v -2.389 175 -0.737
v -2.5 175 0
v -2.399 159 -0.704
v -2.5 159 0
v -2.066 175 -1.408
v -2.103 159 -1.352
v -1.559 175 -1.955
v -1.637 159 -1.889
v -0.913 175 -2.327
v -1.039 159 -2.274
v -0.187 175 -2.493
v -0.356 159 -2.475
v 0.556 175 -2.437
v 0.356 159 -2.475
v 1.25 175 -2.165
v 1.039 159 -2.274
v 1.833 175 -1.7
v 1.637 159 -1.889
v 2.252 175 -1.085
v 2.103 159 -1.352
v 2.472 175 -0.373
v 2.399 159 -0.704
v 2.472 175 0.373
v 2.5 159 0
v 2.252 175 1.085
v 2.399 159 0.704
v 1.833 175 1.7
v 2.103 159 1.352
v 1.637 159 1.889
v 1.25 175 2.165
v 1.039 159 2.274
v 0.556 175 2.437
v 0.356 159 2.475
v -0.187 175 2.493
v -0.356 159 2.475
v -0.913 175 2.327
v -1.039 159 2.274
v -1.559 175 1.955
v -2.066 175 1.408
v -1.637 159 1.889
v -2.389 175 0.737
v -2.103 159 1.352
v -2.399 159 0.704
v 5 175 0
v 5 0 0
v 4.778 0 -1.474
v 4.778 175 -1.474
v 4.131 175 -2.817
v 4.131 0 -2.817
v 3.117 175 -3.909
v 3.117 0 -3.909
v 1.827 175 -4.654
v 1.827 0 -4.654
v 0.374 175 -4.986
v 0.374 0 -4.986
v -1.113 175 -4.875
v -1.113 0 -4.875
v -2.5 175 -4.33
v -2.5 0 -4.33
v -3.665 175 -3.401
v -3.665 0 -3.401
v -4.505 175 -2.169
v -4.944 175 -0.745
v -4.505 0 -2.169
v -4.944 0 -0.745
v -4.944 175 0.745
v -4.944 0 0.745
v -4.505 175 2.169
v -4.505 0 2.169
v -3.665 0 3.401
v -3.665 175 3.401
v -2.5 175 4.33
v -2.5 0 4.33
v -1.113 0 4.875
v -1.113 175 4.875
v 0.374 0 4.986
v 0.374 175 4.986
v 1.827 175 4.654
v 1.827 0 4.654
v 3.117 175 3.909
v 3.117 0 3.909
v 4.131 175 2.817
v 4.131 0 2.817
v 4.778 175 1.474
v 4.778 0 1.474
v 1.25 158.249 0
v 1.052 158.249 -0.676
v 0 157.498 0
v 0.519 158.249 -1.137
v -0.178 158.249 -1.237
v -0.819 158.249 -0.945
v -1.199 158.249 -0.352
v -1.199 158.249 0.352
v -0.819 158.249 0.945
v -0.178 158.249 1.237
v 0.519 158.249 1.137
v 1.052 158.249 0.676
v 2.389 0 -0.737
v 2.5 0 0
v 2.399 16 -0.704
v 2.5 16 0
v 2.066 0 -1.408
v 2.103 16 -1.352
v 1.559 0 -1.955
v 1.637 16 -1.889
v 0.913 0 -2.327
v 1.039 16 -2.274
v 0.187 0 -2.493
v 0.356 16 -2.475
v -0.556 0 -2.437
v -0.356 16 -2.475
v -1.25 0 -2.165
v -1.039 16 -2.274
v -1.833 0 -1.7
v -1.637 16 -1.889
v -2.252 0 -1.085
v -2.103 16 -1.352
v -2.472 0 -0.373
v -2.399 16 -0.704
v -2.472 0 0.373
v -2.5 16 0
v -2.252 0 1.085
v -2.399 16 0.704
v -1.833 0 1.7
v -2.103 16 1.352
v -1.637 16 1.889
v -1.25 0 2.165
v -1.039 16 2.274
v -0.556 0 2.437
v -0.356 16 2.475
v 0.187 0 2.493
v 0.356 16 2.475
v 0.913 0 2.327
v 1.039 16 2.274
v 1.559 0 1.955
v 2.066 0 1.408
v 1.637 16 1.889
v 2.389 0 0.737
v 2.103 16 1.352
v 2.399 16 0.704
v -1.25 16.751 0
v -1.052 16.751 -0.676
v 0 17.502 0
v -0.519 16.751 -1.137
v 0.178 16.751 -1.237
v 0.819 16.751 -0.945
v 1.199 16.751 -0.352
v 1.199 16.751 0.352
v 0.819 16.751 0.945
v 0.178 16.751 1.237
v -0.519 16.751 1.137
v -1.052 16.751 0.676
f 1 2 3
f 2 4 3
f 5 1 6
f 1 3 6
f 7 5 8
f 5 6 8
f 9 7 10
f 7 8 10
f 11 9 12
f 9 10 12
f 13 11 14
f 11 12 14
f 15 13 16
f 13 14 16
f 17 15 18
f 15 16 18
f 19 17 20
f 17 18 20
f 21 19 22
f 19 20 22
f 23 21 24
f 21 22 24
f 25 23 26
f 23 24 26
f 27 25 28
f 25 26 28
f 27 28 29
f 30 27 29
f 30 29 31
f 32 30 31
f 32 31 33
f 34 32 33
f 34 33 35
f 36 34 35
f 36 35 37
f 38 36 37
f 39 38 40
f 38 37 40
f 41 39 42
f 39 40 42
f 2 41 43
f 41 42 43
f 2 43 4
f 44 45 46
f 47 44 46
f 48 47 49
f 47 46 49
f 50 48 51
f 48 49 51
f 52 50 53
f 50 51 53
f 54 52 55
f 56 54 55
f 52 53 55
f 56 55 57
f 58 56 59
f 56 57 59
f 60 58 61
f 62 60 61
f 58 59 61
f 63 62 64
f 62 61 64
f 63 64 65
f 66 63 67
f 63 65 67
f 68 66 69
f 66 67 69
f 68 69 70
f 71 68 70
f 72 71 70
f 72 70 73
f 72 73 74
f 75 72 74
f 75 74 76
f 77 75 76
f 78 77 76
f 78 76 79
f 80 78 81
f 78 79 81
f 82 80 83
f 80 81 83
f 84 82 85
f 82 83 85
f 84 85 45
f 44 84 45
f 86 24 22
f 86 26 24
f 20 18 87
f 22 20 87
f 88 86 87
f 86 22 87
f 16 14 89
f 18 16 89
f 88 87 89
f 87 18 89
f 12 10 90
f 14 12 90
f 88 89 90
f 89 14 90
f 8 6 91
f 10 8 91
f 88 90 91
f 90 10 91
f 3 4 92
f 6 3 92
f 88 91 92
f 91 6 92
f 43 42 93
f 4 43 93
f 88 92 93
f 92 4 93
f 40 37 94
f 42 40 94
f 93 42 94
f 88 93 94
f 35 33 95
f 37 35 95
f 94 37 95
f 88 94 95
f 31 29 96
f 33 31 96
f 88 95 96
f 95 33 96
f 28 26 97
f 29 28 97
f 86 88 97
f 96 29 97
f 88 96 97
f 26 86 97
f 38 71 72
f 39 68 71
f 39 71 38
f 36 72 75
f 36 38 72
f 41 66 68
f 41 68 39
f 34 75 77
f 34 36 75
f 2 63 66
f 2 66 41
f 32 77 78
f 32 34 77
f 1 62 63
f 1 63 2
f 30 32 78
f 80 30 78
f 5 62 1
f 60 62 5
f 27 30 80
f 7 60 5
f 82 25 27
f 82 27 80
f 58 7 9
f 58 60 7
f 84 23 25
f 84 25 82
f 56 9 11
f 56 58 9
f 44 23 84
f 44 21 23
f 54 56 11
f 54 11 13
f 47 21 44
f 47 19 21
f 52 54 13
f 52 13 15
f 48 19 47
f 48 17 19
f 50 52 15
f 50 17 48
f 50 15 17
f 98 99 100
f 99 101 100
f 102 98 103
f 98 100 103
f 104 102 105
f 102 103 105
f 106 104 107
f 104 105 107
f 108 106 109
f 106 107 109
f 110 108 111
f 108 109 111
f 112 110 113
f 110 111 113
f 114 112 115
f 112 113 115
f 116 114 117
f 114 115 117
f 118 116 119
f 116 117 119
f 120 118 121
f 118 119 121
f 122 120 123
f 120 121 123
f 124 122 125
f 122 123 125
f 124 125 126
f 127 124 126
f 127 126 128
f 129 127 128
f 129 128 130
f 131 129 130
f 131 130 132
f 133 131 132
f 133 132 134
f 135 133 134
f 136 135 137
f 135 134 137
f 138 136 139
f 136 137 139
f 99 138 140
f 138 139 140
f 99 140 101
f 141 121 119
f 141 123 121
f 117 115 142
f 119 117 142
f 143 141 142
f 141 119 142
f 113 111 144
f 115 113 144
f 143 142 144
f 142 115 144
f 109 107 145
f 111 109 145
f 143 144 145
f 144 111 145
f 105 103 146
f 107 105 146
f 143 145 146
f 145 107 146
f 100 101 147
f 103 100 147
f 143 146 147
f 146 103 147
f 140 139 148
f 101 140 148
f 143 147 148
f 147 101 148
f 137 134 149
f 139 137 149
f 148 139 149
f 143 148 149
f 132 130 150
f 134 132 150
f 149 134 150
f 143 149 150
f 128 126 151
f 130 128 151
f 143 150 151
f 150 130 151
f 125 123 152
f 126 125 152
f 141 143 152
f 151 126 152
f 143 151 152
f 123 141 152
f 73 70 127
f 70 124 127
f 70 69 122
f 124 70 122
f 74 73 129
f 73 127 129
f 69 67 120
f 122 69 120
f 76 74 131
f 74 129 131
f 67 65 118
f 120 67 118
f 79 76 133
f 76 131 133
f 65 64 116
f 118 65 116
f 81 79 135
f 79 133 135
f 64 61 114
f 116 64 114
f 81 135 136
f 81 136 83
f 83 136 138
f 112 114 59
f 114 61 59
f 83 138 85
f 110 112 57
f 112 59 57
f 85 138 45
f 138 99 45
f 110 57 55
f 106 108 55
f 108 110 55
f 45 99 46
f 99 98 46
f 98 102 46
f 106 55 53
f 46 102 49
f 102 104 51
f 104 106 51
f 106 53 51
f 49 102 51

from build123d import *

# Parameters (mm, degrees)
SKETCH2_R             = 5
BOSS_EXTRUDE2_DEPTH   = 175
M6_TAPPED_HOLE1_D     = 5
M6_TAPPED_HOLE1_DEPTH = 16
M6_TAPPED_HOLE1_TIP   = 1.502151548
M6_TAPPED_HOLE2_D     = 5
M6_TAPPED_HOLE2_DEPTH = 16
M6_TAPPED_HOLE2_TIP   = 1.502151548


with BuildPart() as part:
    # Sketch2 → Boss-Extrude2 (new body)
    with BuildSketch(Plane(origin=(0, 0, 0), x_dir=(1, 0, 0), z_dir=(0, 1, 0))):
        Circle(SKETCH2_R)
    extrude(amount=BOSS_EXTRUDE2_DEPTH)

    # M6 Tapped Hole1
    with Locations(Plane(origin=(0, 175, 0), x_dir=(1, 0, 0), z_dir=(0, 1, 0))):
        with Locations((0, 0)):
            Hole(M6_TAPPED_HOLE1_D / 2, depth=M6_TAPPED_HOLE1_DEPTH)
            with Locations((0, 0, -(M6_TAPPED_HOLE1_DEPTH + M6_TAPPED_HOLE1_TIP / 2))):  # 118° drill point
                Cone(0, M6_TAPPED_HOLE1_D / 2, M6_TAPPED_HOLE1_TIP, mode=Mode.SUBTRACT)

    # M6 Tapped Hole2
    with Locations(Plane(origin=(0, 0, 0), x_dir=(-1, 0, 0), z_dir=(0, -1, 0))):
        with Locations((0, 0)):
            Hole(M6_TAPPED_HOLE2_D / 2, depth=M6_TAPPED_HOLE2_DEPTH)
            with Locations((0, 0, -(M6_TAPPED_HOLE2_DEPTH + M6_TAPPED_HOLE2_TIP / 2))):  # 118° drill point
                Cone(0, M6_TAPPED_HOLE2_D / 2, M6_TAPPED_HOLE2_TIP, mode=Mode.SUBTRACT)


solid = part.part
